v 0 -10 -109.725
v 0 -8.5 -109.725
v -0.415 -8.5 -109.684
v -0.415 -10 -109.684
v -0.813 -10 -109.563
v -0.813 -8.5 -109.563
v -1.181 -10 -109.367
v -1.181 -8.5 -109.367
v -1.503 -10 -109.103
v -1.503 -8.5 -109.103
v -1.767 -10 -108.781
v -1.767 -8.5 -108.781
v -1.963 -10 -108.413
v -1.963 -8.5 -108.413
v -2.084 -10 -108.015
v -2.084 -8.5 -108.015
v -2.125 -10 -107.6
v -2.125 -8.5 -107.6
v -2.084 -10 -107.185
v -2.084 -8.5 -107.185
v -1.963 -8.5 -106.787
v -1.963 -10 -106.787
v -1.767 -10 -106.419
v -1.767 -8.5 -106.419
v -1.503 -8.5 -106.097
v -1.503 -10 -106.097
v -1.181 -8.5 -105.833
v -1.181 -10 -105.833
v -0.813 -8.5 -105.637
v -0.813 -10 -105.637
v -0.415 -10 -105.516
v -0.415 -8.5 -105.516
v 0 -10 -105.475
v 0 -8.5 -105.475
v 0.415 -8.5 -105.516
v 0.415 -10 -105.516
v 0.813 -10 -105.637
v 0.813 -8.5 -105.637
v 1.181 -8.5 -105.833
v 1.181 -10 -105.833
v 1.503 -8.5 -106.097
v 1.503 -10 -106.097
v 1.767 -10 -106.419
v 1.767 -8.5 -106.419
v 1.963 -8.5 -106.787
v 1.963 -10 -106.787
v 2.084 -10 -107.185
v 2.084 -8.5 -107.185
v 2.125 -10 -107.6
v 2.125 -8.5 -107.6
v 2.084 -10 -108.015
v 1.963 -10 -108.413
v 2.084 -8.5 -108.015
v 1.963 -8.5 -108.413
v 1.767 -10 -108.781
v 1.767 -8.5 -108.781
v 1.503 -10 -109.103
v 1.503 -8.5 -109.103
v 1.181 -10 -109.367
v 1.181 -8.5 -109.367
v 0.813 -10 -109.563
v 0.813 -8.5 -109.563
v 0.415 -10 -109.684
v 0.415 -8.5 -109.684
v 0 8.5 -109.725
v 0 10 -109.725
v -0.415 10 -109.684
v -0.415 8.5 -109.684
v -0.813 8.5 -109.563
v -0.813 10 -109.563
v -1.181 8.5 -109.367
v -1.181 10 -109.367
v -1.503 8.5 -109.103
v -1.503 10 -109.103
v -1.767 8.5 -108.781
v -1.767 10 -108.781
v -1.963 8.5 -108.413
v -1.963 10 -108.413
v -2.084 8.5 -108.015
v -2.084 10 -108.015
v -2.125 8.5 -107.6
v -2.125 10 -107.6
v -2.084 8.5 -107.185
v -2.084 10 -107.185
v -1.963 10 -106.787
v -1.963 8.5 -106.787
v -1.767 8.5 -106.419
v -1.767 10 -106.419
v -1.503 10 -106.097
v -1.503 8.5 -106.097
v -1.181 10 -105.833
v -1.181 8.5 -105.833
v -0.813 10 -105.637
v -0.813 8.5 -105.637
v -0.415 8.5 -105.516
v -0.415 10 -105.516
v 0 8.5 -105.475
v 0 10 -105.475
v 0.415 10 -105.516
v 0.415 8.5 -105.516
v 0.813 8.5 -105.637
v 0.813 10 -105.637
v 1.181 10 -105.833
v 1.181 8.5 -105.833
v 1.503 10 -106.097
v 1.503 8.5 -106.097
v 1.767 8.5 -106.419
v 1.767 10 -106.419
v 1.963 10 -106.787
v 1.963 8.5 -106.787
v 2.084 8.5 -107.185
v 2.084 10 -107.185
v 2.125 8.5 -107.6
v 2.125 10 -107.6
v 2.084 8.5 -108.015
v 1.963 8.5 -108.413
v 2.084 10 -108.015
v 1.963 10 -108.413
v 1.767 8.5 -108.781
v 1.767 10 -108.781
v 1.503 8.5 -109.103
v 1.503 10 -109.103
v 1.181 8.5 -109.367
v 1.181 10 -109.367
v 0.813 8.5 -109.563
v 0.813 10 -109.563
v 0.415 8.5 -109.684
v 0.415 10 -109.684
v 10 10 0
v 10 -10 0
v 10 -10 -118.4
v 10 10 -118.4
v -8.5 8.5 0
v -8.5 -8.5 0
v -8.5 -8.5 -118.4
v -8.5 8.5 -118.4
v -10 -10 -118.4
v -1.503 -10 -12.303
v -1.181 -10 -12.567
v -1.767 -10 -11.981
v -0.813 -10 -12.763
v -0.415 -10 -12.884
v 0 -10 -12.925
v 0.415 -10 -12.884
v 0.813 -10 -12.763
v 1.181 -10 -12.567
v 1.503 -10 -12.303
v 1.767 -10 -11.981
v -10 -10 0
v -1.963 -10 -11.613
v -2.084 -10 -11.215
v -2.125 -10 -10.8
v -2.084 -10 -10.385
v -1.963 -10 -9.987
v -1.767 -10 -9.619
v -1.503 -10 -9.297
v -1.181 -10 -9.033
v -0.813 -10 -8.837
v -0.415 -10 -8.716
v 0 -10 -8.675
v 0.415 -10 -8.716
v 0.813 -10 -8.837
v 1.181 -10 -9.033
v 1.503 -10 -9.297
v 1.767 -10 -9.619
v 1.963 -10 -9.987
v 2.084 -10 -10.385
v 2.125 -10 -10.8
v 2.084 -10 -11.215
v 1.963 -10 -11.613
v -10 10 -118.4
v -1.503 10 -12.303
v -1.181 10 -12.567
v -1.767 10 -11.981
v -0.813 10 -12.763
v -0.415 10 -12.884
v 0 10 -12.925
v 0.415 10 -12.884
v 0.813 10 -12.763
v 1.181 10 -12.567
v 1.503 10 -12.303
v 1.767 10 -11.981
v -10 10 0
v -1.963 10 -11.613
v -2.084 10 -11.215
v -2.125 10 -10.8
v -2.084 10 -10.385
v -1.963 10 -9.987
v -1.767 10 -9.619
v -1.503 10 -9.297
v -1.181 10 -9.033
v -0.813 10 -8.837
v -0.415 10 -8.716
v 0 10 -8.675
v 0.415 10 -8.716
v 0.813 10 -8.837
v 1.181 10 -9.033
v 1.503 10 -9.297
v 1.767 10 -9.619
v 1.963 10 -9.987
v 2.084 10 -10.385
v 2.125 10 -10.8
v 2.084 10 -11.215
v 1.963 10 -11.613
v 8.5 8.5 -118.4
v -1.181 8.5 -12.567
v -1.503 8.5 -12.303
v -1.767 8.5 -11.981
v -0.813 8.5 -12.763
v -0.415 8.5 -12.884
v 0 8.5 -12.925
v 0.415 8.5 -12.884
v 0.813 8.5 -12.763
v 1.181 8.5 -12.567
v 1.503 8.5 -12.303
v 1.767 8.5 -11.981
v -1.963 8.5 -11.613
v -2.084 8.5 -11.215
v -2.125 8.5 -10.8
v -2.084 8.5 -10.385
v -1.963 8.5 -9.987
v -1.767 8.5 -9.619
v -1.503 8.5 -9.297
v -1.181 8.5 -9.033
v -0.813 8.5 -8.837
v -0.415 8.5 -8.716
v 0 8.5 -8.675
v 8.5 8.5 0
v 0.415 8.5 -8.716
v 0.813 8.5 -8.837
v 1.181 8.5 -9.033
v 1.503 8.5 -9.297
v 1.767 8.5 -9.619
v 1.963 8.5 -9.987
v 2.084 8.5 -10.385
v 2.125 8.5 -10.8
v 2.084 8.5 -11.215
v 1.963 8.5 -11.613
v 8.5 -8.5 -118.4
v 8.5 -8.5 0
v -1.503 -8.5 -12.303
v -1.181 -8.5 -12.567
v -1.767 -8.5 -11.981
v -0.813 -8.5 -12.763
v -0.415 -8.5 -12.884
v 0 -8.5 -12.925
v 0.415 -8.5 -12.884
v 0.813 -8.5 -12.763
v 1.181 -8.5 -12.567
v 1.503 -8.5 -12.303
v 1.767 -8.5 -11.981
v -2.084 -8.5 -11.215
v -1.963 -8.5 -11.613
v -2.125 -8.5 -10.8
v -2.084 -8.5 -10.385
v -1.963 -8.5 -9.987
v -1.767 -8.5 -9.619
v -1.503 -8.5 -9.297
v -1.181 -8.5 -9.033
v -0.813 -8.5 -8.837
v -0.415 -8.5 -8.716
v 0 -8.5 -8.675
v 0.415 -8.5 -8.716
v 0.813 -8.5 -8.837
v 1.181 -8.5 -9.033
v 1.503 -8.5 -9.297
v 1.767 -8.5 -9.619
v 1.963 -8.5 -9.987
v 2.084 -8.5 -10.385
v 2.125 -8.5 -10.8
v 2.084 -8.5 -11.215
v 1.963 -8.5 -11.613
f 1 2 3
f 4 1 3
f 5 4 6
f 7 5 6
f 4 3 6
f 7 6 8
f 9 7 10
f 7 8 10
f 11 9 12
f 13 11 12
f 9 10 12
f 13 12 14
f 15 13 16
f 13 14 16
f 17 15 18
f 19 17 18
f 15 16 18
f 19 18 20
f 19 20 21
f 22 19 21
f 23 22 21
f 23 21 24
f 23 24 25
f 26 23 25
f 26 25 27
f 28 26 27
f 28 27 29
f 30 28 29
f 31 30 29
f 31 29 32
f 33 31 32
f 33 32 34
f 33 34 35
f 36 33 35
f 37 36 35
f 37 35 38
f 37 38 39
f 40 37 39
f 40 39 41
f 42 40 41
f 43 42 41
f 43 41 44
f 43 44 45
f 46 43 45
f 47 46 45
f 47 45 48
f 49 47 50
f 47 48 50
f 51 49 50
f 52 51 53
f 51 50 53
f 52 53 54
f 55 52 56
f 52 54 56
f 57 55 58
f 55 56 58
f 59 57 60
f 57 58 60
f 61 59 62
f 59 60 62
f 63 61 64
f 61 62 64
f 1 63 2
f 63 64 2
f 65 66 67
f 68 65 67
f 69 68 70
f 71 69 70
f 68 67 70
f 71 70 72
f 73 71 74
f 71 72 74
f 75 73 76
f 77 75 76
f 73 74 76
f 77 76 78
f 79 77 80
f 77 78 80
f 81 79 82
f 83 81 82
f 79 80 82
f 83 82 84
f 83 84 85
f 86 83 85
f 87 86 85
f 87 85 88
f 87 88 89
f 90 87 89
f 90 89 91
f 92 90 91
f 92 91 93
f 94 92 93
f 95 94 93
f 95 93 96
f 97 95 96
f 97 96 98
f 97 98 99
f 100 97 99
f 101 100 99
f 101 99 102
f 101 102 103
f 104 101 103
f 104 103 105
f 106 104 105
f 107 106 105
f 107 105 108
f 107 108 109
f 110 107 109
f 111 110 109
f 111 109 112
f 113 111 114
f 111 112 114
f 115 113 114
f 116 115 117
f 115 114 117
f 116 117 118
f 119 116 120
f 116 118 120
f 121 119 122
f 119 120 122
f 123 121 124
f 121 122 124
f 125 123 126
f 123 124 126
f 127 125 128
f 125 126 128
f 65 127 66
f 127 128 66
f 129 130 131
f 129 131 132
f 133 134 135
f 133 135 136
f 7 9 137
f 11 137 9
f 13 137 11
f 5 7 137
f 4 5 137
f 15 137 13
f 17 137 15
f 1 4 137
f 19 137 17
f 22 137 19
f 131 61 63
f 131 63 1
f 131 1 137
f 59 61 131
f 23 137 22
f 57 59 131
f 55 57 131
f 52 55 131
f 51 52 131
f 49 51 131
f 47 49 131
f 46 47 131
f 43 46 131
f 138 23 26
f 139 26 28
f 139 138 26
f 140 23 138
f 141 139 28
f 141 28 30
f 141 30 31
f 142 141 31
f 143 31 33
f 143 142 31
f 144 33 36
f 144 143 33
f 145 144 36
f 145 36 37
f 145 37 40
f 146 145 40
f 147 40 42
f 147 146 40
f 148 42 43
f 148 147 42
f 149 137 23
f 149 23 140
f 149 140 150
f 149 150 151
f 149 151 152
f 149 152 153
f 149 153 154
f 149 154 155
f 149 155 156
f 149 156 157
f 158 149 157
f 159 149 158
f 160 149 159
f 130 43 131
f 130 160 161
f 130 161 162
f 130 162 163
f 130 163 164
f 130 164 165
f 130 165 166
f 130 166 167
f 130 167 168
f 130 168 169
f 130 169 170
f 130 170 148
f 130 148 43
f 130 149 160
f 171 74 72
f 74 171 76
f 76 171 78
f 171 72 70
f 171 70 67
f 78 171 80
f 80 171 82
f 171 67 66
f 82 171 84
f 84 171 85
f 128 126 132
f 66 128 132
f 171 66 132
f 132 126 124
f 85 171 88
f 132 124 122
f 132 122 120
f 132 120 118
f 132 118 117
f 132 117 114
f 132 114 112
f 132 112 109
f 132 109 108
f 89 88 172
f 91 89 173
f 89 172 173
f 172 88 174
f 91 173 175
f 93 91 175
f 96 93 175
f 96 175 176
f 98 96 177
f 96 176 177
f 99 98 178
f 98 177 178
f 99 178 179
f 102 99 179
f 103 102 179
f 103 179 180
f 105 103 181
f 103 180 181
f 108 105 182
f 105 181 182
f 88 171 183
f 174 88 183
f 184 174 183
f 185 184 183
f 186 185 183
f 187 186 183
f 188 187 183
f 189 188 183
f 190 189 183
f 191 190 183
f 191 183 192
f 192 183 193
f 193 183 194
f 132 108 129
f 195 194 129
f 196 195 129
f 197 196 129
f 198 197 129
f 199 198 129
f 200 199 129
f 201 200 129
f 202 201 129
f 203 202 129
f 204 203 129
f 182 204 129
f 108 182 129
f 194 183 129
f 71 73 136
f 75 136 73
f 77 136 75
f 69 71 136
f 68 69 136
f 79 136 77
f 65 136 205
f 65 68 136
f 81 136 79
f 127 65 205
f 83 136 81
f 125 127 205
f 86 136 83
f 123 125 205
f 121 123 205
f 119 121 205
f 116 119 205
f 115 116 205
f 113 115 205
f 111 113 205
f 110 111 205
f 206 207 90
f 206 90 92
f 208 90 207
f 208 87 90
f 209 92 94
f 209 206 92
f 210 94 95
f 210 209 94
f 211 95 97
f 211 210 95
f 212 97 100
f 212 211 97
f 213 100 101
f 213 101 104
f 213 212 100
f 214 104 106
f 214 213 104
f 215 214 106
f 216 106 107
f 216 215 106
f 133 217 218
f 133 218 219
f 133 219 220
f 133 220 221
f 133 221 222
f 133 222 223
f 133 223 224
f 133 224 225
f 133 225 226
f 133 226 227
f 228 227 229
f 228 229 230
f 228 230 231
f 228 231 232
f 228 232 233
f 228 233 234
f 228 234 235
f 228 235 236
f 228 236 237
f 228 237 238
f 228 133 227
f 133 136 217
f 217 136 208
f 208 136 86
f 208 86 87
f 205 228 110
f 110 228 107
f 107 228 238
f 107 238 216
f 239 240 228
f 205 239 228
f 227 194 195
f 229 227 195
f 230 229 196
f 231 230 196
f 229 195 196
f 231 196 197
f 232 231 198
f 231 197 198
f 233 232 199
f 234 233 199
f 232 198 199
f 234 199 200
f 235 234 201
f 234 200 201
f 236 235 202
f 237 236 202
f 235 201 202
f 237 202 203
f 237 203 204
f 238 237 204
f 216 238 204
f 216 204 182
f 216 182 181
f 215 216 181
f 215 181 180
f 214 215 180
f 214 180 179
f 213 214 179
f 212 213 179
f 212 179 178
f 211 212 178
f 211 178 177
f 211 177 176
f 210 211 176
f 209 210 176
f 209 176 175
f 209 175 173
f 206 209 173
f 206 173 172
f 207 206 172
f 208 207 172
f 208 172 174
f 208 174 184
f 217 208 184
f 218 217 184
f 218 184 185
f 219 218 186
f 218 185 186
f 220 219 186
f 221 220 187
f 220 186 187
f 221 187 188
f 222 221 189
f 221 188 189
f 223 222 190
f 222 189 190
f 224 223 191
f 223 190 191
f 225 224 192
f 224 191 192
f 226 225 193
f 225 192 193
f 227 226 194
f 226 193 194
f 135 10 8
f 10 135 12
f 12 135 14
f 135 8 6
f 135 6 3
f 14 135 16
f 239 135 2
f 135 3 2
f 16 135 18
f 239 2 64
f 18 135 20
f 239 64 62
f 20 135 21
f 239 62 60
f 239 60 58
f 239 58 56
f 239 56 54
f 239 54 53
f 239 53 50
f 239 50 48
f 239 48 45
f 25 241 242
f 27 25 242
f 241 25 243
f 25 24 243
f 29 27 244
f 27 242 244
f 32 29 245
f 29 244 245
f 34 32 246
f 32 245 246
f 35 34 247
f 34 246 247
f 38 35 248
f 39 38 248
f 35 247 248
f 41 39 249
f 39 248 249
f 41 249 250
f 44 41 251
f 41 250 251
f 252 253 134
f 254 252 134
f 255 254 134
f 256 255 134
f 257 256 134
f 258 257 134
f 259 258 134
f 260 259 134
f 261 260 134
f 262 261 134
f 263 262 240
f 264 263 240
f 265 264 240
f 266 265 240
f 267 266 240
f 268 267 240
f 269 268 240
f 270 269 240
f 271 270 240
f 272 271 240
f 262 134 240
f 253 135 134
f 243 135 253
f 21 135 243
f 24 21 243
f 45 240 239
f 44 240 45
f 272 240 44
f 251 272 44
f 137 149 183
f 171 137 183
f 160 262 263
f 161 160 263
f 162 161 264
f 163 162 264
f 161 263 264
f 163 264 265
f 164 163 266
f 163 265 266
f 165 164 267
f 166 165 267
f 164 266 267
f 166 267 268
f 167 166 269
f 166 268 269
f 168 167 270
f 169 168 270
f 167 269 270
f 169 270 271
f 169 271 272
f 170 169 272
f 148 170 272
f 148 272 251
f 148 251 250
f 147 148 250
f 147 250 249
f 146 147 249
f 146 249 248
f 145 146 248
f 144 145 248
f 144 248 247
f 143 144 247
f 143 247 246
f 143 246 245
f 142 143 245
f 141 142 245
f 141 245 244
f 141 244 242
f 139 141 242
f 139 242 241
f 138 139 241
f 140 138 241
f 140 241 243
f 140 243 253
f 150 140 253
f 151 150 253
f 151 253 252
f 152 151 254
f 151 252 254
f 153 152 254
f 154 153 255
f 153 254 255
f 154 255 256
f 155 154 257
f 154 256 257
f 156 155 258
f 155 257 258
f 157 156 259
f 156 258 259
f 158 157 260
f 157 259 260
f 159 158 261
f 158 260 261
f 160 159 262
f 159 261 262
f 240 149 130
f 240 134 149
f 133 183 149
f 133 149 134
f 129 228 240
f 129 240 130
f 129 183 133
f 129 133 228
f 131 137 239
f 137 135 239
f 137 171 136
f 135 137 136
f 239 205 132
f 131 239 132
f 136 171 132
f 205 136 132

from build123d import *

# Parameters (mm, degrees)
SKETCH1_W           = 20
SKETCH1_H           = 20
SKETCH1_W_2         = 17
SKETCH1_H_2         = 17
BOSS_EXTRUDE1_DEPTH = 118.4
SKETCH2_R           = 2.125
CUT_EXTRUDE1_DEPTH  = 121.492987348


with BuildPart() as part:
    # Sketch1 → Boss-Extrude1 (new body)
    with BuildSketch(Plane.XY):
        Rectangle(SKETCH1_W, SKETCH1_H)
        Rectangle(SKETCH1_W_2, SKETCH1_H_2, mode=Mode.SUBTRACT)
    extrude(amount=-BOSS_EXTRUDE1_DEPTH)

    # Sketch2 → Cut-Extrude1 (cut, through all)
    with BuildSketch(Plane(origin=(0, 10, 0), x_dir=(1, 0, 0), z_dir=(0, 1, 0))):
        with Locations(Location((0, 10.8, 0), (0, 0, 270))):
            Circle(SKETCH2_R)
        with Locations(Location((0, 107.6, 0), (0, 0, 90))):
            Circle(SKETCH2_R)
    extrude(amount=-CUT_EXTRUDE1_DEPTH, mode=Mode.SUBTRACT)


solid = part.part
